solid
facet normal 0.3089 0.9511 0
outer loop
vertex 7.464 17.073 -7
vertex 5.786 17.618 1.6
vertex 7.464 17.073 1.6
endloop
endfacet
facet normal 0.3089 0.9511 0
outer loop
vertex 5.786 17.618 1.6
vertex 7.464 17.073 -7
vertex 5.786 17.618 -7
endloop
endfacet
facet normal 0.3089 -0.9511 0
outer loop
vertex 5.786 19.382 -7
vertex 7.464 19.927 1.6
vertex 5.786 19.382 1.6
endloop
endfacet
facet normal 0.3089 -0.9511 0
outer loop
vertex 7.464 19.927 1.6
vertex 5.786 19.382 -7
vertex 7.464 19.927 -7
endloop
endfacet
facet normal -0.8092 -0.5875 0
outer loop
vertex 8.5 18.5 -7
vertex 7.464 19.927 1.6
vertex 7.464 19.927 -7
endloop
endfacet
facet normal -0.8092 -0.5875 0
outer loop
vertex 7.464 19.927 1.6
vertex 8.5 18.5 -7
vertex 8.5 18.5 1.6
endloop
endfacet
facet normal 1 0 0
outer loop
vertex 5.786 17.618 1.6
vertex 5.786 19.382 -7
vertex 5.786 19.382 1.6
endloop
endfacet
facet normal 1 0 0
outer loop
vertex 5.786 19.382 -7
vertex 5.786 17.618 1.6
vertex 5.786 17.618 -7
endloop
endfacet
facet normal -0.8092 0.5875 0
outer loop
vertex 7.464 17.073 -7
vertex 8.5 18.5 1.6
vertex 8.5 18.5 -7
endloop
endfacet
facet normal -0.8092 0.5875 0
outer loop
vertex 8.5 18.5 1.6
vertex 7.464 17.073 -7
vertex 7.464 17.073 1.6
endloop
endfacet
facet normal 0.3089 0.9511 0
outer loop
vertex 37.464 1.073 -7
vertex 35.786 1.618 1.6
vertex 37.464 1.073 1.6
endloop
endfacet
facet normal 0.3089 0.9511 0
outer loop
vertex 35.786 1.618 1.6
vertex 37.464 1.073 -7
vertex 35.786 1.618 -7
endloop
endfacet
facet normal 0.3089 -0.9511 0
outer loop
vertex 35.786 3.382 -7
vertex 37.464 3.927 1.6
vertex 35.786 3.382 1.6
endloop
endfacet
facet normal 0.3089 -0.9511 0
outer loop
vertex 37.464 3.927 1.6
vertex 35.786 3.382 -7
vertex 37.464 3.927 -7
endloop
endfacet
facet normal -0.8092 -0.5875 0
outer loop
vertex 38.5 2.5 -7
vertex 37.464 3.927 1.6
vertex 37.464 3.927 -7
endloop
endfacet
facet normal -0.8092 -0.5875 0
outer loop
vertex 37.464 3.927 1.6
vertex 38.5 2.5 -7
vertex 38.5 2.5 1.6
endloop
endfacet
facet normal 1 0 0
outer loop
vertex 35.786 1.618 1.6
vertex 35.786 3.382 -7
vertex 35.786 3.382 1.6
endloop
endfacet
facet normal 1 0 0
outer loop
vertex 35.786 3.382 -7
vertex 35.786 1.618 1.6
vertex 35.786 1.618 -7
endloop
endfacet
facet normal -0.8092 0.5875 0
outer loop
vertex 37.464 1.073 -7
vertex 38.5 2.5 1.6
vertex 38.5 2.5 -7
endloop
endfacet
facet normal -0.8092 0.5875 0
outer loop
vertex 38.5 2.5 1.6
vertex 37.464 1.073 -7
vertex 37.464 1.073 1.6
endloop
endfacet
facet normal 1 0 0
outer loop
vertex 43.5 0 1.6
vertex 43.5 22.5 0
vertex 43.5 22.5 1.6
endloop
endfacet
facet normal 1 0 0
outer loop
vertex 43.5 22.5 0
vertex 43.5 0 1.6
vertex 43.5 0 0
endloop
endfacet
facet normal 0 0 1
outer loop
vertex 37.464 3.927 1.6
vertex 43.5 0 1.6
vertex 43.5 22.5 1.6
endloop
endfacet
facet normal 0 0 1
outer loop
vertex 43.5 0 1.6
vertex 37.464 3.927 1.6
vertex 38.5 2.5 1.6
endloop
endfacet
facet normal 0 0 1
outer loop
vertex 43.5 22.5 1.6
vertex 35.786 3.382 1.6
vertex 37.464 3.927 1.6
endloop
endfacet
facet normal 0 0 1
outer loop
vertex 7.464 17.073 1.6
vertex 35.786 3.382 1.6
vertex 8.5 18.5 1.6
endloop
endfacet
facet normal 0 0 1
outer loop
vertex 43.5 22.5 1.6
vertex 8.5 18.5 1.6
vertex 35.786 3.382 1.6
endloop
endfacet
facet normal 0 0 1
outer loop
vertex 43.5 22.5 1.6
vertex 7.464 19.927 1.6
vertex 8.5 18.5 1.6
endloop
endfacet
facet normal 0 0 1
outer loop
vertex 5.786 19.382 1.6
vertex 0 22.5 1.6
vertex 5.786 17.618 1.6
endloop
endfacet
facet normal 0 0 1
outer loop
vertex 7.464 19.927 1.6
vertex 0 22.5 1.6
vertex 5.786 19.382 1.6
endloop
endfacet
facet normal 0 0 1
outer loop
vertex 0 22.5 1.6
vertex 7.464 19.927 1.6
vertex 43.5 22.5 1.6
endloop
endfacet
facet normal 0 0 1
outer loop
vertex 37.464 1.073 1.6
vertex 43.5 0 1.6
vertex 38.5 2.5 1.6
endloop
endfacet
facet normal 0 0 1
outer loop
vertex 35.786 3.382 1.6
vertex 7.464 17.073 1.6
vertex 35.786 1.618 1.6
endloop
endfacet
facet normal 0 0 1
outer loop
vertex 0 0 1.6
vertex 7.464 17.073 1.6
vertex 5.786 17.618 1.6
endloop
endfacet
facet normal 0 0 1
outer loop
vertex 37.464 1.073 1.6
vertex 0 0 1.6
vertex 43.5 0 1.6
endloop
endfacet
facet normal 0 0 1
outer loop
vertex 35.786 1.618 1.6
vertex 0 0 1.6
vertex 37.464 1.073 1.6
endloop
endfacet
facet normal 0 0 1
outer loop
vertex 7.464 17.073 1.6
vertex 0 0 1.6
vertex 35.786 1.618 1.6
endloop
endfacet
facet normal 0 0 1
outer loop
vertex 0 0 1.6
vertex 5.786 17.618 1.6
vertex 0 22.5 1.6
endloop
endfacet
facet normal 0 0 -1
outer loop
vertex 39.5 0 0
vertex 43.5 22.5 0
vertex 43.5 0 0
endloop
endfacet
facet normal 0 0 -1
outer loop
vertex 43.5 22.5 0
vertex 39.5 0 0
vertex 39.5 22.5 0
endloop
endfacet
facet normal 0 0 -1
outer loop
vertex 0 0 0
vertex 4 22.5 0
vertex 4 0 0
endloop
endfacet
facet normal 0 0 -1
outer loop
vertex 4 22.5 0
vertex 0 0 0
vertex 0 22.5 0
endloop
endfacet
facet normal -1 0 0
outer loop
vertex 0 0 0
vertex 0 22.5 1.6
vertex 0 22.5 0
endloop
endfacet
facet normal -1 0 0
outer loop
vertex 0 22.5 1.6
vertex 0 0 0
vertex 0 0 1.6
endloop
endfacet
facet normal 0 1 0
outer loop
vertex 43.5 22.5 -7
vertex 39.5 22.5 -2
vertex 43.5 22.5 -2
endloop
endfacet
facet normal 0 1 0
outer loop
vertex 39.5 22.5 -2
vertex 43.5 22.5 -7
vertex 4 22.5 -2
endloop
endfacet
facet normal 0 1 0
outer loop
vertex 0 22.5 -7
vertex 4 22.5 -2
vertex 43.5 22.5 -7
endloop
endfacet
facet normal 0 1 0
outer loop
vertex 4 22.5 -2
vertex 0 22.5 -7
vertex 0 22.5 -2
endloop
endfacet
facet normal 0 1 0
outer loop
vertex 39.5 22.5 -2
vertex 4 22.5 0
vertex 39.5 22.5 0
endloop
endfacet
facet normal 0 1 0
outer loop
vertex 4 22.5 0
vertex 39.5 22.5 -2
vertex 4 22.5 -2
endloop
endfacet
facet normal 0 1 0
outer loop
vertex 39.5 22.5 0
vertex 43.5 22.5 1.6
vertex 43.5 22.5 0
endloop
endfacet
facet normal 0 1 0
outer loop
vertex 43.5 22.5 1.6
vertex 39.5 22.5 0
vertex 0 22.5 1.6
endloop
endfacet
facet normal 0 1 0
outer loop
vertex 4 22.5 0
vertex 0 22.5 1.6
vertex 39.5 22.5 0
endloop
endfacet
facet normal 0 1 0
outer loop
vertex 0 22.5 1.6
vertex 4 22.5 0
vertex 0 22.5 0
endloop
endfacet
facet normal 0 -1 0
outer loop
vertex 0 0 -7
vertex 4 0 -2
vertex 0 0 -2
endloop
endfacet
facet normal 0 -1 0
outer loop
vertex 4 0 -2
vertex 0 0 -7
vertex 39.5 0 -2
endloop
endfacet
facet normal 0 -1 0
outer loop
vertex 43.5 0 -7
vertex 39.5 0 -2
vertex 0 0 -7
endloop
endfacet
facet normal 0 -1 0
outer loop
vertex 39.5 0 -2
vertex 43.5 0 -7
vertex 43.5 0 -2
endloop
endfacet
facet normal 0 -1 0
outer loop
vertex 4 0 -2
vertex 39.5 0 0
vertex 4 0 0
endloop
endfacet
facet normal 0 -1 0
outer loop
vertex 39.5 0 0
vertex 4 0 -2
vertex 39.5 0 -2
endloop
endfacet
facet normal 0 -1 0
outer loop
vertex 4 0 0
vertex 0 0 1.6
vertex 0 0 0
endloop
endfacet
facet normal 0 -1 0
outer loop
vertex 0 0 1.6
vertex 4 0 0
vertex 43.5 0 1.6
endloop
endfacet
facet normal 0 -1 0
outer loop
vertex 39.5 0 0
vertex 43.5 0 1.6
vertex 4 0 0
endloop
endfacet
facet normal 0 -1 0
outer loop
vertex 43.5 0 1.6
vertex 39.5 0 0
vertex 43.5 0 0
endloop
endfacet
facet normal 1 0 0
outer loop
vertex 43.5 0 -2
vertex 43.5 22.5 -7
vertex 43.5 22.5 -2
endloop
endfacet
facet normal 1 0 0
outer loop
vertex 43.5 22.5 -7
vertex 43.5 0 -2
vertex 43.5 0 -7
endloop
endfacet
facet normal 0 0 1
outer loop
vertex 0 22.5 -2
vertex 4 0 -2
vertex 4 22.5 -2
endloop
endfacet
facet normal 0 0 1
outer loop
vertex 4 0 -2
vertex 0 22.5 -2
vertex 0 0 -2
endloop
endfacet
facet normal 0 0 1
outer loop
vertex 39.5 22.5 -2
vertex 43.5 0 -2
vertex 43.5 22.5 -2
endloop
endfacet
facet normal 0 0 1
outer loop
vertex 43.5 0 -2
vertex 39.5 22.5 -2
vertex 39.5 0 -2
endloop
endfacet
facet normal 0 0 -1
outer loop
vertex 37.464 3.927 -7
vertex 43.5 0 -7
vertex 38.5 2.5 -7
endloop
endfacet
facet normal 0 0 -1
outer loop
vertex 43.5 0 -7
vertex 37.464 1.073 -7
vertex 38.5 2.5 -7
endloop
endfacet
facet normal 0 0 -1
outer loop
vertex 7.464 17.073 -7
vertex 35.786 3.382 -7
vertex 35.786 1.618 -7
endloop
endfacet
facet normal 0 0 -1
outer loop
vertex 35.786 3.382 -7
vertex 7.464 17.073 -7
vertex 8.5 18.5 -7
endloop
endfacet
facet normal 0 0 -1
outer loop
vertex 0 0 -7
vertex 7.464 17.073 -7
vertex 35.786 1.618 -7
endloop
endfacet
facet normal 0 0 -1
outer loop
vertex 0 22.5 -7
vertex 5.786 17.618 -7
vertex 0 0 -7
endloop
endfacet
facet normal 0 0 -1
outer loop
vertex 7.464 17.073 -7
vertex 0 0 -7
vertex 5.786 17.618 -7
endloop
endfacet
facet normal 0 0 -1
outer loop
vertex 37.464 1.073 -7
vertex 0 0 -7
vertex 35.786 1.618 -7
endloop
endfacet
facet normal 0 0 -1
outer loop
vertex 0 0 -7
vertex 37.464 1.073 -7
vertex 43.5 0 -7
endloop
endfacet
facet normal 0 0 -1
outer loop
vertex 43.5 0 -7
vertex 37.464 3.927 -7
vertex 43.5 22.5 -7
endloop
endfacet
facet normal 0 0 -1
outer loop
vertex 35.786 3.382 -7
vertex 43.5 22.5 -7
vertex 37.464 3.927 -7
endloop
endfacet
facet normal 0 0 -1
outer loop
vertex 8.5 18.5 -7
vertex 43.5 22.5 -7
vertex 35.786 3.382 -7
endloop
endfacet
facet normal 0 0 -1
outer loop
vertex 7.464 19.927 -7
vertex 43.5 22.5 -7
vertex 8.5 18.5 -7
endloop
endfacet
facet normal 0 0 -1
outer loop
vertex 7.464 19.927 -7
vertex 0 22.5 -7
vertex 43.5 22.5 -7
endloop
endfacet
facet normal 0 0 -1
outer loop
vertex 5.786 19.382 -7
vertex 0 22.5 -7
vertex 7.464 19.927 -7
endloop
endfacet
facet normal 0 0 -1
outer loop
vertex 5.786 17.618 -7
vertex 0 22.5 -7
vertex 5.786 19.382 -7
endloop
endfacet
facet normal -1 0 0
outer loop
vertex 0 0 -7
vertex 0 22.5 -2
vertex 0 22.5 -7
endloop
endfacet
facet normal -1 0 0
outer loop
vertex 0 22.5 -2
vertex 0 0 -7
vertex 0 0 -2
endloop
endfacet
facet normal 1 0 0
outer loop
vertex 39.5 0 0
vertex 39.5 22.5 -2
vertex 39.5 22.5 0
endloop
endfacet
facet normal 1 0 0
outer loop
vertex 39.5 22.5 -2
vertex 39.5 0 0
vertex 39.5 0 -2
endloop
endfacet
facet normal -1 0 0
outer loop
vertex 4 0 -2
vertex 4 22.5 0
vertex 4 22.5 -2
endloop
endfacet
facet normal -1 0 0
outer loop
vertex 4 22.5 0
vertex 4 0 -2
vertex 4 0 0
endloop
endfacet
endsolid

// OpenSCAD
module lm2596DcDcBody(){
    //pcb max dimensions, not the contour
    color([0,0,0.5])
        cube([43.5, 22.5, 1.6]);
    //socket headers for ardiuno
    /*color([0,0,0]){
        translate([0.5, 0.5,1]){
            cube([2.54*8, 2.54, 2.54]);
        }
    }*/
}

module lm2596DcDcHolePattern(r,h){
    rr = 3/2;
    translate([5.5+rr, 17+rr, 0]){
        cylinder(h, r, r);
    }

    translate([35.5+rr, 1+rr, 0]){
        cylinder(h, r, r);
    }
    
}

module lm2596DcDcModule(){
    difference(){
        lm2596DcDcBody();
        translate([0, 0, -1])
            lm2596DcDcHolePattern(3/2, 3);
    }
}

module lm2596DcDcFixture(r, th){
    difference(){
        union(){
            translate([0, 0, -th-2])
                cube([43.5, 22.5, th]);
            translate([4, 0, -2])
                cube([43.5-8, 22.5, 2]);
        }
        
            translate([0, 0, 0-th-3])
                lm2596DcDcHolePattern(r, th+4);
        
        
        }
}

//lm2596DcDcBody();
lm2596DcDcModule();
lm2596DcDcFixture(3/2, 5);
